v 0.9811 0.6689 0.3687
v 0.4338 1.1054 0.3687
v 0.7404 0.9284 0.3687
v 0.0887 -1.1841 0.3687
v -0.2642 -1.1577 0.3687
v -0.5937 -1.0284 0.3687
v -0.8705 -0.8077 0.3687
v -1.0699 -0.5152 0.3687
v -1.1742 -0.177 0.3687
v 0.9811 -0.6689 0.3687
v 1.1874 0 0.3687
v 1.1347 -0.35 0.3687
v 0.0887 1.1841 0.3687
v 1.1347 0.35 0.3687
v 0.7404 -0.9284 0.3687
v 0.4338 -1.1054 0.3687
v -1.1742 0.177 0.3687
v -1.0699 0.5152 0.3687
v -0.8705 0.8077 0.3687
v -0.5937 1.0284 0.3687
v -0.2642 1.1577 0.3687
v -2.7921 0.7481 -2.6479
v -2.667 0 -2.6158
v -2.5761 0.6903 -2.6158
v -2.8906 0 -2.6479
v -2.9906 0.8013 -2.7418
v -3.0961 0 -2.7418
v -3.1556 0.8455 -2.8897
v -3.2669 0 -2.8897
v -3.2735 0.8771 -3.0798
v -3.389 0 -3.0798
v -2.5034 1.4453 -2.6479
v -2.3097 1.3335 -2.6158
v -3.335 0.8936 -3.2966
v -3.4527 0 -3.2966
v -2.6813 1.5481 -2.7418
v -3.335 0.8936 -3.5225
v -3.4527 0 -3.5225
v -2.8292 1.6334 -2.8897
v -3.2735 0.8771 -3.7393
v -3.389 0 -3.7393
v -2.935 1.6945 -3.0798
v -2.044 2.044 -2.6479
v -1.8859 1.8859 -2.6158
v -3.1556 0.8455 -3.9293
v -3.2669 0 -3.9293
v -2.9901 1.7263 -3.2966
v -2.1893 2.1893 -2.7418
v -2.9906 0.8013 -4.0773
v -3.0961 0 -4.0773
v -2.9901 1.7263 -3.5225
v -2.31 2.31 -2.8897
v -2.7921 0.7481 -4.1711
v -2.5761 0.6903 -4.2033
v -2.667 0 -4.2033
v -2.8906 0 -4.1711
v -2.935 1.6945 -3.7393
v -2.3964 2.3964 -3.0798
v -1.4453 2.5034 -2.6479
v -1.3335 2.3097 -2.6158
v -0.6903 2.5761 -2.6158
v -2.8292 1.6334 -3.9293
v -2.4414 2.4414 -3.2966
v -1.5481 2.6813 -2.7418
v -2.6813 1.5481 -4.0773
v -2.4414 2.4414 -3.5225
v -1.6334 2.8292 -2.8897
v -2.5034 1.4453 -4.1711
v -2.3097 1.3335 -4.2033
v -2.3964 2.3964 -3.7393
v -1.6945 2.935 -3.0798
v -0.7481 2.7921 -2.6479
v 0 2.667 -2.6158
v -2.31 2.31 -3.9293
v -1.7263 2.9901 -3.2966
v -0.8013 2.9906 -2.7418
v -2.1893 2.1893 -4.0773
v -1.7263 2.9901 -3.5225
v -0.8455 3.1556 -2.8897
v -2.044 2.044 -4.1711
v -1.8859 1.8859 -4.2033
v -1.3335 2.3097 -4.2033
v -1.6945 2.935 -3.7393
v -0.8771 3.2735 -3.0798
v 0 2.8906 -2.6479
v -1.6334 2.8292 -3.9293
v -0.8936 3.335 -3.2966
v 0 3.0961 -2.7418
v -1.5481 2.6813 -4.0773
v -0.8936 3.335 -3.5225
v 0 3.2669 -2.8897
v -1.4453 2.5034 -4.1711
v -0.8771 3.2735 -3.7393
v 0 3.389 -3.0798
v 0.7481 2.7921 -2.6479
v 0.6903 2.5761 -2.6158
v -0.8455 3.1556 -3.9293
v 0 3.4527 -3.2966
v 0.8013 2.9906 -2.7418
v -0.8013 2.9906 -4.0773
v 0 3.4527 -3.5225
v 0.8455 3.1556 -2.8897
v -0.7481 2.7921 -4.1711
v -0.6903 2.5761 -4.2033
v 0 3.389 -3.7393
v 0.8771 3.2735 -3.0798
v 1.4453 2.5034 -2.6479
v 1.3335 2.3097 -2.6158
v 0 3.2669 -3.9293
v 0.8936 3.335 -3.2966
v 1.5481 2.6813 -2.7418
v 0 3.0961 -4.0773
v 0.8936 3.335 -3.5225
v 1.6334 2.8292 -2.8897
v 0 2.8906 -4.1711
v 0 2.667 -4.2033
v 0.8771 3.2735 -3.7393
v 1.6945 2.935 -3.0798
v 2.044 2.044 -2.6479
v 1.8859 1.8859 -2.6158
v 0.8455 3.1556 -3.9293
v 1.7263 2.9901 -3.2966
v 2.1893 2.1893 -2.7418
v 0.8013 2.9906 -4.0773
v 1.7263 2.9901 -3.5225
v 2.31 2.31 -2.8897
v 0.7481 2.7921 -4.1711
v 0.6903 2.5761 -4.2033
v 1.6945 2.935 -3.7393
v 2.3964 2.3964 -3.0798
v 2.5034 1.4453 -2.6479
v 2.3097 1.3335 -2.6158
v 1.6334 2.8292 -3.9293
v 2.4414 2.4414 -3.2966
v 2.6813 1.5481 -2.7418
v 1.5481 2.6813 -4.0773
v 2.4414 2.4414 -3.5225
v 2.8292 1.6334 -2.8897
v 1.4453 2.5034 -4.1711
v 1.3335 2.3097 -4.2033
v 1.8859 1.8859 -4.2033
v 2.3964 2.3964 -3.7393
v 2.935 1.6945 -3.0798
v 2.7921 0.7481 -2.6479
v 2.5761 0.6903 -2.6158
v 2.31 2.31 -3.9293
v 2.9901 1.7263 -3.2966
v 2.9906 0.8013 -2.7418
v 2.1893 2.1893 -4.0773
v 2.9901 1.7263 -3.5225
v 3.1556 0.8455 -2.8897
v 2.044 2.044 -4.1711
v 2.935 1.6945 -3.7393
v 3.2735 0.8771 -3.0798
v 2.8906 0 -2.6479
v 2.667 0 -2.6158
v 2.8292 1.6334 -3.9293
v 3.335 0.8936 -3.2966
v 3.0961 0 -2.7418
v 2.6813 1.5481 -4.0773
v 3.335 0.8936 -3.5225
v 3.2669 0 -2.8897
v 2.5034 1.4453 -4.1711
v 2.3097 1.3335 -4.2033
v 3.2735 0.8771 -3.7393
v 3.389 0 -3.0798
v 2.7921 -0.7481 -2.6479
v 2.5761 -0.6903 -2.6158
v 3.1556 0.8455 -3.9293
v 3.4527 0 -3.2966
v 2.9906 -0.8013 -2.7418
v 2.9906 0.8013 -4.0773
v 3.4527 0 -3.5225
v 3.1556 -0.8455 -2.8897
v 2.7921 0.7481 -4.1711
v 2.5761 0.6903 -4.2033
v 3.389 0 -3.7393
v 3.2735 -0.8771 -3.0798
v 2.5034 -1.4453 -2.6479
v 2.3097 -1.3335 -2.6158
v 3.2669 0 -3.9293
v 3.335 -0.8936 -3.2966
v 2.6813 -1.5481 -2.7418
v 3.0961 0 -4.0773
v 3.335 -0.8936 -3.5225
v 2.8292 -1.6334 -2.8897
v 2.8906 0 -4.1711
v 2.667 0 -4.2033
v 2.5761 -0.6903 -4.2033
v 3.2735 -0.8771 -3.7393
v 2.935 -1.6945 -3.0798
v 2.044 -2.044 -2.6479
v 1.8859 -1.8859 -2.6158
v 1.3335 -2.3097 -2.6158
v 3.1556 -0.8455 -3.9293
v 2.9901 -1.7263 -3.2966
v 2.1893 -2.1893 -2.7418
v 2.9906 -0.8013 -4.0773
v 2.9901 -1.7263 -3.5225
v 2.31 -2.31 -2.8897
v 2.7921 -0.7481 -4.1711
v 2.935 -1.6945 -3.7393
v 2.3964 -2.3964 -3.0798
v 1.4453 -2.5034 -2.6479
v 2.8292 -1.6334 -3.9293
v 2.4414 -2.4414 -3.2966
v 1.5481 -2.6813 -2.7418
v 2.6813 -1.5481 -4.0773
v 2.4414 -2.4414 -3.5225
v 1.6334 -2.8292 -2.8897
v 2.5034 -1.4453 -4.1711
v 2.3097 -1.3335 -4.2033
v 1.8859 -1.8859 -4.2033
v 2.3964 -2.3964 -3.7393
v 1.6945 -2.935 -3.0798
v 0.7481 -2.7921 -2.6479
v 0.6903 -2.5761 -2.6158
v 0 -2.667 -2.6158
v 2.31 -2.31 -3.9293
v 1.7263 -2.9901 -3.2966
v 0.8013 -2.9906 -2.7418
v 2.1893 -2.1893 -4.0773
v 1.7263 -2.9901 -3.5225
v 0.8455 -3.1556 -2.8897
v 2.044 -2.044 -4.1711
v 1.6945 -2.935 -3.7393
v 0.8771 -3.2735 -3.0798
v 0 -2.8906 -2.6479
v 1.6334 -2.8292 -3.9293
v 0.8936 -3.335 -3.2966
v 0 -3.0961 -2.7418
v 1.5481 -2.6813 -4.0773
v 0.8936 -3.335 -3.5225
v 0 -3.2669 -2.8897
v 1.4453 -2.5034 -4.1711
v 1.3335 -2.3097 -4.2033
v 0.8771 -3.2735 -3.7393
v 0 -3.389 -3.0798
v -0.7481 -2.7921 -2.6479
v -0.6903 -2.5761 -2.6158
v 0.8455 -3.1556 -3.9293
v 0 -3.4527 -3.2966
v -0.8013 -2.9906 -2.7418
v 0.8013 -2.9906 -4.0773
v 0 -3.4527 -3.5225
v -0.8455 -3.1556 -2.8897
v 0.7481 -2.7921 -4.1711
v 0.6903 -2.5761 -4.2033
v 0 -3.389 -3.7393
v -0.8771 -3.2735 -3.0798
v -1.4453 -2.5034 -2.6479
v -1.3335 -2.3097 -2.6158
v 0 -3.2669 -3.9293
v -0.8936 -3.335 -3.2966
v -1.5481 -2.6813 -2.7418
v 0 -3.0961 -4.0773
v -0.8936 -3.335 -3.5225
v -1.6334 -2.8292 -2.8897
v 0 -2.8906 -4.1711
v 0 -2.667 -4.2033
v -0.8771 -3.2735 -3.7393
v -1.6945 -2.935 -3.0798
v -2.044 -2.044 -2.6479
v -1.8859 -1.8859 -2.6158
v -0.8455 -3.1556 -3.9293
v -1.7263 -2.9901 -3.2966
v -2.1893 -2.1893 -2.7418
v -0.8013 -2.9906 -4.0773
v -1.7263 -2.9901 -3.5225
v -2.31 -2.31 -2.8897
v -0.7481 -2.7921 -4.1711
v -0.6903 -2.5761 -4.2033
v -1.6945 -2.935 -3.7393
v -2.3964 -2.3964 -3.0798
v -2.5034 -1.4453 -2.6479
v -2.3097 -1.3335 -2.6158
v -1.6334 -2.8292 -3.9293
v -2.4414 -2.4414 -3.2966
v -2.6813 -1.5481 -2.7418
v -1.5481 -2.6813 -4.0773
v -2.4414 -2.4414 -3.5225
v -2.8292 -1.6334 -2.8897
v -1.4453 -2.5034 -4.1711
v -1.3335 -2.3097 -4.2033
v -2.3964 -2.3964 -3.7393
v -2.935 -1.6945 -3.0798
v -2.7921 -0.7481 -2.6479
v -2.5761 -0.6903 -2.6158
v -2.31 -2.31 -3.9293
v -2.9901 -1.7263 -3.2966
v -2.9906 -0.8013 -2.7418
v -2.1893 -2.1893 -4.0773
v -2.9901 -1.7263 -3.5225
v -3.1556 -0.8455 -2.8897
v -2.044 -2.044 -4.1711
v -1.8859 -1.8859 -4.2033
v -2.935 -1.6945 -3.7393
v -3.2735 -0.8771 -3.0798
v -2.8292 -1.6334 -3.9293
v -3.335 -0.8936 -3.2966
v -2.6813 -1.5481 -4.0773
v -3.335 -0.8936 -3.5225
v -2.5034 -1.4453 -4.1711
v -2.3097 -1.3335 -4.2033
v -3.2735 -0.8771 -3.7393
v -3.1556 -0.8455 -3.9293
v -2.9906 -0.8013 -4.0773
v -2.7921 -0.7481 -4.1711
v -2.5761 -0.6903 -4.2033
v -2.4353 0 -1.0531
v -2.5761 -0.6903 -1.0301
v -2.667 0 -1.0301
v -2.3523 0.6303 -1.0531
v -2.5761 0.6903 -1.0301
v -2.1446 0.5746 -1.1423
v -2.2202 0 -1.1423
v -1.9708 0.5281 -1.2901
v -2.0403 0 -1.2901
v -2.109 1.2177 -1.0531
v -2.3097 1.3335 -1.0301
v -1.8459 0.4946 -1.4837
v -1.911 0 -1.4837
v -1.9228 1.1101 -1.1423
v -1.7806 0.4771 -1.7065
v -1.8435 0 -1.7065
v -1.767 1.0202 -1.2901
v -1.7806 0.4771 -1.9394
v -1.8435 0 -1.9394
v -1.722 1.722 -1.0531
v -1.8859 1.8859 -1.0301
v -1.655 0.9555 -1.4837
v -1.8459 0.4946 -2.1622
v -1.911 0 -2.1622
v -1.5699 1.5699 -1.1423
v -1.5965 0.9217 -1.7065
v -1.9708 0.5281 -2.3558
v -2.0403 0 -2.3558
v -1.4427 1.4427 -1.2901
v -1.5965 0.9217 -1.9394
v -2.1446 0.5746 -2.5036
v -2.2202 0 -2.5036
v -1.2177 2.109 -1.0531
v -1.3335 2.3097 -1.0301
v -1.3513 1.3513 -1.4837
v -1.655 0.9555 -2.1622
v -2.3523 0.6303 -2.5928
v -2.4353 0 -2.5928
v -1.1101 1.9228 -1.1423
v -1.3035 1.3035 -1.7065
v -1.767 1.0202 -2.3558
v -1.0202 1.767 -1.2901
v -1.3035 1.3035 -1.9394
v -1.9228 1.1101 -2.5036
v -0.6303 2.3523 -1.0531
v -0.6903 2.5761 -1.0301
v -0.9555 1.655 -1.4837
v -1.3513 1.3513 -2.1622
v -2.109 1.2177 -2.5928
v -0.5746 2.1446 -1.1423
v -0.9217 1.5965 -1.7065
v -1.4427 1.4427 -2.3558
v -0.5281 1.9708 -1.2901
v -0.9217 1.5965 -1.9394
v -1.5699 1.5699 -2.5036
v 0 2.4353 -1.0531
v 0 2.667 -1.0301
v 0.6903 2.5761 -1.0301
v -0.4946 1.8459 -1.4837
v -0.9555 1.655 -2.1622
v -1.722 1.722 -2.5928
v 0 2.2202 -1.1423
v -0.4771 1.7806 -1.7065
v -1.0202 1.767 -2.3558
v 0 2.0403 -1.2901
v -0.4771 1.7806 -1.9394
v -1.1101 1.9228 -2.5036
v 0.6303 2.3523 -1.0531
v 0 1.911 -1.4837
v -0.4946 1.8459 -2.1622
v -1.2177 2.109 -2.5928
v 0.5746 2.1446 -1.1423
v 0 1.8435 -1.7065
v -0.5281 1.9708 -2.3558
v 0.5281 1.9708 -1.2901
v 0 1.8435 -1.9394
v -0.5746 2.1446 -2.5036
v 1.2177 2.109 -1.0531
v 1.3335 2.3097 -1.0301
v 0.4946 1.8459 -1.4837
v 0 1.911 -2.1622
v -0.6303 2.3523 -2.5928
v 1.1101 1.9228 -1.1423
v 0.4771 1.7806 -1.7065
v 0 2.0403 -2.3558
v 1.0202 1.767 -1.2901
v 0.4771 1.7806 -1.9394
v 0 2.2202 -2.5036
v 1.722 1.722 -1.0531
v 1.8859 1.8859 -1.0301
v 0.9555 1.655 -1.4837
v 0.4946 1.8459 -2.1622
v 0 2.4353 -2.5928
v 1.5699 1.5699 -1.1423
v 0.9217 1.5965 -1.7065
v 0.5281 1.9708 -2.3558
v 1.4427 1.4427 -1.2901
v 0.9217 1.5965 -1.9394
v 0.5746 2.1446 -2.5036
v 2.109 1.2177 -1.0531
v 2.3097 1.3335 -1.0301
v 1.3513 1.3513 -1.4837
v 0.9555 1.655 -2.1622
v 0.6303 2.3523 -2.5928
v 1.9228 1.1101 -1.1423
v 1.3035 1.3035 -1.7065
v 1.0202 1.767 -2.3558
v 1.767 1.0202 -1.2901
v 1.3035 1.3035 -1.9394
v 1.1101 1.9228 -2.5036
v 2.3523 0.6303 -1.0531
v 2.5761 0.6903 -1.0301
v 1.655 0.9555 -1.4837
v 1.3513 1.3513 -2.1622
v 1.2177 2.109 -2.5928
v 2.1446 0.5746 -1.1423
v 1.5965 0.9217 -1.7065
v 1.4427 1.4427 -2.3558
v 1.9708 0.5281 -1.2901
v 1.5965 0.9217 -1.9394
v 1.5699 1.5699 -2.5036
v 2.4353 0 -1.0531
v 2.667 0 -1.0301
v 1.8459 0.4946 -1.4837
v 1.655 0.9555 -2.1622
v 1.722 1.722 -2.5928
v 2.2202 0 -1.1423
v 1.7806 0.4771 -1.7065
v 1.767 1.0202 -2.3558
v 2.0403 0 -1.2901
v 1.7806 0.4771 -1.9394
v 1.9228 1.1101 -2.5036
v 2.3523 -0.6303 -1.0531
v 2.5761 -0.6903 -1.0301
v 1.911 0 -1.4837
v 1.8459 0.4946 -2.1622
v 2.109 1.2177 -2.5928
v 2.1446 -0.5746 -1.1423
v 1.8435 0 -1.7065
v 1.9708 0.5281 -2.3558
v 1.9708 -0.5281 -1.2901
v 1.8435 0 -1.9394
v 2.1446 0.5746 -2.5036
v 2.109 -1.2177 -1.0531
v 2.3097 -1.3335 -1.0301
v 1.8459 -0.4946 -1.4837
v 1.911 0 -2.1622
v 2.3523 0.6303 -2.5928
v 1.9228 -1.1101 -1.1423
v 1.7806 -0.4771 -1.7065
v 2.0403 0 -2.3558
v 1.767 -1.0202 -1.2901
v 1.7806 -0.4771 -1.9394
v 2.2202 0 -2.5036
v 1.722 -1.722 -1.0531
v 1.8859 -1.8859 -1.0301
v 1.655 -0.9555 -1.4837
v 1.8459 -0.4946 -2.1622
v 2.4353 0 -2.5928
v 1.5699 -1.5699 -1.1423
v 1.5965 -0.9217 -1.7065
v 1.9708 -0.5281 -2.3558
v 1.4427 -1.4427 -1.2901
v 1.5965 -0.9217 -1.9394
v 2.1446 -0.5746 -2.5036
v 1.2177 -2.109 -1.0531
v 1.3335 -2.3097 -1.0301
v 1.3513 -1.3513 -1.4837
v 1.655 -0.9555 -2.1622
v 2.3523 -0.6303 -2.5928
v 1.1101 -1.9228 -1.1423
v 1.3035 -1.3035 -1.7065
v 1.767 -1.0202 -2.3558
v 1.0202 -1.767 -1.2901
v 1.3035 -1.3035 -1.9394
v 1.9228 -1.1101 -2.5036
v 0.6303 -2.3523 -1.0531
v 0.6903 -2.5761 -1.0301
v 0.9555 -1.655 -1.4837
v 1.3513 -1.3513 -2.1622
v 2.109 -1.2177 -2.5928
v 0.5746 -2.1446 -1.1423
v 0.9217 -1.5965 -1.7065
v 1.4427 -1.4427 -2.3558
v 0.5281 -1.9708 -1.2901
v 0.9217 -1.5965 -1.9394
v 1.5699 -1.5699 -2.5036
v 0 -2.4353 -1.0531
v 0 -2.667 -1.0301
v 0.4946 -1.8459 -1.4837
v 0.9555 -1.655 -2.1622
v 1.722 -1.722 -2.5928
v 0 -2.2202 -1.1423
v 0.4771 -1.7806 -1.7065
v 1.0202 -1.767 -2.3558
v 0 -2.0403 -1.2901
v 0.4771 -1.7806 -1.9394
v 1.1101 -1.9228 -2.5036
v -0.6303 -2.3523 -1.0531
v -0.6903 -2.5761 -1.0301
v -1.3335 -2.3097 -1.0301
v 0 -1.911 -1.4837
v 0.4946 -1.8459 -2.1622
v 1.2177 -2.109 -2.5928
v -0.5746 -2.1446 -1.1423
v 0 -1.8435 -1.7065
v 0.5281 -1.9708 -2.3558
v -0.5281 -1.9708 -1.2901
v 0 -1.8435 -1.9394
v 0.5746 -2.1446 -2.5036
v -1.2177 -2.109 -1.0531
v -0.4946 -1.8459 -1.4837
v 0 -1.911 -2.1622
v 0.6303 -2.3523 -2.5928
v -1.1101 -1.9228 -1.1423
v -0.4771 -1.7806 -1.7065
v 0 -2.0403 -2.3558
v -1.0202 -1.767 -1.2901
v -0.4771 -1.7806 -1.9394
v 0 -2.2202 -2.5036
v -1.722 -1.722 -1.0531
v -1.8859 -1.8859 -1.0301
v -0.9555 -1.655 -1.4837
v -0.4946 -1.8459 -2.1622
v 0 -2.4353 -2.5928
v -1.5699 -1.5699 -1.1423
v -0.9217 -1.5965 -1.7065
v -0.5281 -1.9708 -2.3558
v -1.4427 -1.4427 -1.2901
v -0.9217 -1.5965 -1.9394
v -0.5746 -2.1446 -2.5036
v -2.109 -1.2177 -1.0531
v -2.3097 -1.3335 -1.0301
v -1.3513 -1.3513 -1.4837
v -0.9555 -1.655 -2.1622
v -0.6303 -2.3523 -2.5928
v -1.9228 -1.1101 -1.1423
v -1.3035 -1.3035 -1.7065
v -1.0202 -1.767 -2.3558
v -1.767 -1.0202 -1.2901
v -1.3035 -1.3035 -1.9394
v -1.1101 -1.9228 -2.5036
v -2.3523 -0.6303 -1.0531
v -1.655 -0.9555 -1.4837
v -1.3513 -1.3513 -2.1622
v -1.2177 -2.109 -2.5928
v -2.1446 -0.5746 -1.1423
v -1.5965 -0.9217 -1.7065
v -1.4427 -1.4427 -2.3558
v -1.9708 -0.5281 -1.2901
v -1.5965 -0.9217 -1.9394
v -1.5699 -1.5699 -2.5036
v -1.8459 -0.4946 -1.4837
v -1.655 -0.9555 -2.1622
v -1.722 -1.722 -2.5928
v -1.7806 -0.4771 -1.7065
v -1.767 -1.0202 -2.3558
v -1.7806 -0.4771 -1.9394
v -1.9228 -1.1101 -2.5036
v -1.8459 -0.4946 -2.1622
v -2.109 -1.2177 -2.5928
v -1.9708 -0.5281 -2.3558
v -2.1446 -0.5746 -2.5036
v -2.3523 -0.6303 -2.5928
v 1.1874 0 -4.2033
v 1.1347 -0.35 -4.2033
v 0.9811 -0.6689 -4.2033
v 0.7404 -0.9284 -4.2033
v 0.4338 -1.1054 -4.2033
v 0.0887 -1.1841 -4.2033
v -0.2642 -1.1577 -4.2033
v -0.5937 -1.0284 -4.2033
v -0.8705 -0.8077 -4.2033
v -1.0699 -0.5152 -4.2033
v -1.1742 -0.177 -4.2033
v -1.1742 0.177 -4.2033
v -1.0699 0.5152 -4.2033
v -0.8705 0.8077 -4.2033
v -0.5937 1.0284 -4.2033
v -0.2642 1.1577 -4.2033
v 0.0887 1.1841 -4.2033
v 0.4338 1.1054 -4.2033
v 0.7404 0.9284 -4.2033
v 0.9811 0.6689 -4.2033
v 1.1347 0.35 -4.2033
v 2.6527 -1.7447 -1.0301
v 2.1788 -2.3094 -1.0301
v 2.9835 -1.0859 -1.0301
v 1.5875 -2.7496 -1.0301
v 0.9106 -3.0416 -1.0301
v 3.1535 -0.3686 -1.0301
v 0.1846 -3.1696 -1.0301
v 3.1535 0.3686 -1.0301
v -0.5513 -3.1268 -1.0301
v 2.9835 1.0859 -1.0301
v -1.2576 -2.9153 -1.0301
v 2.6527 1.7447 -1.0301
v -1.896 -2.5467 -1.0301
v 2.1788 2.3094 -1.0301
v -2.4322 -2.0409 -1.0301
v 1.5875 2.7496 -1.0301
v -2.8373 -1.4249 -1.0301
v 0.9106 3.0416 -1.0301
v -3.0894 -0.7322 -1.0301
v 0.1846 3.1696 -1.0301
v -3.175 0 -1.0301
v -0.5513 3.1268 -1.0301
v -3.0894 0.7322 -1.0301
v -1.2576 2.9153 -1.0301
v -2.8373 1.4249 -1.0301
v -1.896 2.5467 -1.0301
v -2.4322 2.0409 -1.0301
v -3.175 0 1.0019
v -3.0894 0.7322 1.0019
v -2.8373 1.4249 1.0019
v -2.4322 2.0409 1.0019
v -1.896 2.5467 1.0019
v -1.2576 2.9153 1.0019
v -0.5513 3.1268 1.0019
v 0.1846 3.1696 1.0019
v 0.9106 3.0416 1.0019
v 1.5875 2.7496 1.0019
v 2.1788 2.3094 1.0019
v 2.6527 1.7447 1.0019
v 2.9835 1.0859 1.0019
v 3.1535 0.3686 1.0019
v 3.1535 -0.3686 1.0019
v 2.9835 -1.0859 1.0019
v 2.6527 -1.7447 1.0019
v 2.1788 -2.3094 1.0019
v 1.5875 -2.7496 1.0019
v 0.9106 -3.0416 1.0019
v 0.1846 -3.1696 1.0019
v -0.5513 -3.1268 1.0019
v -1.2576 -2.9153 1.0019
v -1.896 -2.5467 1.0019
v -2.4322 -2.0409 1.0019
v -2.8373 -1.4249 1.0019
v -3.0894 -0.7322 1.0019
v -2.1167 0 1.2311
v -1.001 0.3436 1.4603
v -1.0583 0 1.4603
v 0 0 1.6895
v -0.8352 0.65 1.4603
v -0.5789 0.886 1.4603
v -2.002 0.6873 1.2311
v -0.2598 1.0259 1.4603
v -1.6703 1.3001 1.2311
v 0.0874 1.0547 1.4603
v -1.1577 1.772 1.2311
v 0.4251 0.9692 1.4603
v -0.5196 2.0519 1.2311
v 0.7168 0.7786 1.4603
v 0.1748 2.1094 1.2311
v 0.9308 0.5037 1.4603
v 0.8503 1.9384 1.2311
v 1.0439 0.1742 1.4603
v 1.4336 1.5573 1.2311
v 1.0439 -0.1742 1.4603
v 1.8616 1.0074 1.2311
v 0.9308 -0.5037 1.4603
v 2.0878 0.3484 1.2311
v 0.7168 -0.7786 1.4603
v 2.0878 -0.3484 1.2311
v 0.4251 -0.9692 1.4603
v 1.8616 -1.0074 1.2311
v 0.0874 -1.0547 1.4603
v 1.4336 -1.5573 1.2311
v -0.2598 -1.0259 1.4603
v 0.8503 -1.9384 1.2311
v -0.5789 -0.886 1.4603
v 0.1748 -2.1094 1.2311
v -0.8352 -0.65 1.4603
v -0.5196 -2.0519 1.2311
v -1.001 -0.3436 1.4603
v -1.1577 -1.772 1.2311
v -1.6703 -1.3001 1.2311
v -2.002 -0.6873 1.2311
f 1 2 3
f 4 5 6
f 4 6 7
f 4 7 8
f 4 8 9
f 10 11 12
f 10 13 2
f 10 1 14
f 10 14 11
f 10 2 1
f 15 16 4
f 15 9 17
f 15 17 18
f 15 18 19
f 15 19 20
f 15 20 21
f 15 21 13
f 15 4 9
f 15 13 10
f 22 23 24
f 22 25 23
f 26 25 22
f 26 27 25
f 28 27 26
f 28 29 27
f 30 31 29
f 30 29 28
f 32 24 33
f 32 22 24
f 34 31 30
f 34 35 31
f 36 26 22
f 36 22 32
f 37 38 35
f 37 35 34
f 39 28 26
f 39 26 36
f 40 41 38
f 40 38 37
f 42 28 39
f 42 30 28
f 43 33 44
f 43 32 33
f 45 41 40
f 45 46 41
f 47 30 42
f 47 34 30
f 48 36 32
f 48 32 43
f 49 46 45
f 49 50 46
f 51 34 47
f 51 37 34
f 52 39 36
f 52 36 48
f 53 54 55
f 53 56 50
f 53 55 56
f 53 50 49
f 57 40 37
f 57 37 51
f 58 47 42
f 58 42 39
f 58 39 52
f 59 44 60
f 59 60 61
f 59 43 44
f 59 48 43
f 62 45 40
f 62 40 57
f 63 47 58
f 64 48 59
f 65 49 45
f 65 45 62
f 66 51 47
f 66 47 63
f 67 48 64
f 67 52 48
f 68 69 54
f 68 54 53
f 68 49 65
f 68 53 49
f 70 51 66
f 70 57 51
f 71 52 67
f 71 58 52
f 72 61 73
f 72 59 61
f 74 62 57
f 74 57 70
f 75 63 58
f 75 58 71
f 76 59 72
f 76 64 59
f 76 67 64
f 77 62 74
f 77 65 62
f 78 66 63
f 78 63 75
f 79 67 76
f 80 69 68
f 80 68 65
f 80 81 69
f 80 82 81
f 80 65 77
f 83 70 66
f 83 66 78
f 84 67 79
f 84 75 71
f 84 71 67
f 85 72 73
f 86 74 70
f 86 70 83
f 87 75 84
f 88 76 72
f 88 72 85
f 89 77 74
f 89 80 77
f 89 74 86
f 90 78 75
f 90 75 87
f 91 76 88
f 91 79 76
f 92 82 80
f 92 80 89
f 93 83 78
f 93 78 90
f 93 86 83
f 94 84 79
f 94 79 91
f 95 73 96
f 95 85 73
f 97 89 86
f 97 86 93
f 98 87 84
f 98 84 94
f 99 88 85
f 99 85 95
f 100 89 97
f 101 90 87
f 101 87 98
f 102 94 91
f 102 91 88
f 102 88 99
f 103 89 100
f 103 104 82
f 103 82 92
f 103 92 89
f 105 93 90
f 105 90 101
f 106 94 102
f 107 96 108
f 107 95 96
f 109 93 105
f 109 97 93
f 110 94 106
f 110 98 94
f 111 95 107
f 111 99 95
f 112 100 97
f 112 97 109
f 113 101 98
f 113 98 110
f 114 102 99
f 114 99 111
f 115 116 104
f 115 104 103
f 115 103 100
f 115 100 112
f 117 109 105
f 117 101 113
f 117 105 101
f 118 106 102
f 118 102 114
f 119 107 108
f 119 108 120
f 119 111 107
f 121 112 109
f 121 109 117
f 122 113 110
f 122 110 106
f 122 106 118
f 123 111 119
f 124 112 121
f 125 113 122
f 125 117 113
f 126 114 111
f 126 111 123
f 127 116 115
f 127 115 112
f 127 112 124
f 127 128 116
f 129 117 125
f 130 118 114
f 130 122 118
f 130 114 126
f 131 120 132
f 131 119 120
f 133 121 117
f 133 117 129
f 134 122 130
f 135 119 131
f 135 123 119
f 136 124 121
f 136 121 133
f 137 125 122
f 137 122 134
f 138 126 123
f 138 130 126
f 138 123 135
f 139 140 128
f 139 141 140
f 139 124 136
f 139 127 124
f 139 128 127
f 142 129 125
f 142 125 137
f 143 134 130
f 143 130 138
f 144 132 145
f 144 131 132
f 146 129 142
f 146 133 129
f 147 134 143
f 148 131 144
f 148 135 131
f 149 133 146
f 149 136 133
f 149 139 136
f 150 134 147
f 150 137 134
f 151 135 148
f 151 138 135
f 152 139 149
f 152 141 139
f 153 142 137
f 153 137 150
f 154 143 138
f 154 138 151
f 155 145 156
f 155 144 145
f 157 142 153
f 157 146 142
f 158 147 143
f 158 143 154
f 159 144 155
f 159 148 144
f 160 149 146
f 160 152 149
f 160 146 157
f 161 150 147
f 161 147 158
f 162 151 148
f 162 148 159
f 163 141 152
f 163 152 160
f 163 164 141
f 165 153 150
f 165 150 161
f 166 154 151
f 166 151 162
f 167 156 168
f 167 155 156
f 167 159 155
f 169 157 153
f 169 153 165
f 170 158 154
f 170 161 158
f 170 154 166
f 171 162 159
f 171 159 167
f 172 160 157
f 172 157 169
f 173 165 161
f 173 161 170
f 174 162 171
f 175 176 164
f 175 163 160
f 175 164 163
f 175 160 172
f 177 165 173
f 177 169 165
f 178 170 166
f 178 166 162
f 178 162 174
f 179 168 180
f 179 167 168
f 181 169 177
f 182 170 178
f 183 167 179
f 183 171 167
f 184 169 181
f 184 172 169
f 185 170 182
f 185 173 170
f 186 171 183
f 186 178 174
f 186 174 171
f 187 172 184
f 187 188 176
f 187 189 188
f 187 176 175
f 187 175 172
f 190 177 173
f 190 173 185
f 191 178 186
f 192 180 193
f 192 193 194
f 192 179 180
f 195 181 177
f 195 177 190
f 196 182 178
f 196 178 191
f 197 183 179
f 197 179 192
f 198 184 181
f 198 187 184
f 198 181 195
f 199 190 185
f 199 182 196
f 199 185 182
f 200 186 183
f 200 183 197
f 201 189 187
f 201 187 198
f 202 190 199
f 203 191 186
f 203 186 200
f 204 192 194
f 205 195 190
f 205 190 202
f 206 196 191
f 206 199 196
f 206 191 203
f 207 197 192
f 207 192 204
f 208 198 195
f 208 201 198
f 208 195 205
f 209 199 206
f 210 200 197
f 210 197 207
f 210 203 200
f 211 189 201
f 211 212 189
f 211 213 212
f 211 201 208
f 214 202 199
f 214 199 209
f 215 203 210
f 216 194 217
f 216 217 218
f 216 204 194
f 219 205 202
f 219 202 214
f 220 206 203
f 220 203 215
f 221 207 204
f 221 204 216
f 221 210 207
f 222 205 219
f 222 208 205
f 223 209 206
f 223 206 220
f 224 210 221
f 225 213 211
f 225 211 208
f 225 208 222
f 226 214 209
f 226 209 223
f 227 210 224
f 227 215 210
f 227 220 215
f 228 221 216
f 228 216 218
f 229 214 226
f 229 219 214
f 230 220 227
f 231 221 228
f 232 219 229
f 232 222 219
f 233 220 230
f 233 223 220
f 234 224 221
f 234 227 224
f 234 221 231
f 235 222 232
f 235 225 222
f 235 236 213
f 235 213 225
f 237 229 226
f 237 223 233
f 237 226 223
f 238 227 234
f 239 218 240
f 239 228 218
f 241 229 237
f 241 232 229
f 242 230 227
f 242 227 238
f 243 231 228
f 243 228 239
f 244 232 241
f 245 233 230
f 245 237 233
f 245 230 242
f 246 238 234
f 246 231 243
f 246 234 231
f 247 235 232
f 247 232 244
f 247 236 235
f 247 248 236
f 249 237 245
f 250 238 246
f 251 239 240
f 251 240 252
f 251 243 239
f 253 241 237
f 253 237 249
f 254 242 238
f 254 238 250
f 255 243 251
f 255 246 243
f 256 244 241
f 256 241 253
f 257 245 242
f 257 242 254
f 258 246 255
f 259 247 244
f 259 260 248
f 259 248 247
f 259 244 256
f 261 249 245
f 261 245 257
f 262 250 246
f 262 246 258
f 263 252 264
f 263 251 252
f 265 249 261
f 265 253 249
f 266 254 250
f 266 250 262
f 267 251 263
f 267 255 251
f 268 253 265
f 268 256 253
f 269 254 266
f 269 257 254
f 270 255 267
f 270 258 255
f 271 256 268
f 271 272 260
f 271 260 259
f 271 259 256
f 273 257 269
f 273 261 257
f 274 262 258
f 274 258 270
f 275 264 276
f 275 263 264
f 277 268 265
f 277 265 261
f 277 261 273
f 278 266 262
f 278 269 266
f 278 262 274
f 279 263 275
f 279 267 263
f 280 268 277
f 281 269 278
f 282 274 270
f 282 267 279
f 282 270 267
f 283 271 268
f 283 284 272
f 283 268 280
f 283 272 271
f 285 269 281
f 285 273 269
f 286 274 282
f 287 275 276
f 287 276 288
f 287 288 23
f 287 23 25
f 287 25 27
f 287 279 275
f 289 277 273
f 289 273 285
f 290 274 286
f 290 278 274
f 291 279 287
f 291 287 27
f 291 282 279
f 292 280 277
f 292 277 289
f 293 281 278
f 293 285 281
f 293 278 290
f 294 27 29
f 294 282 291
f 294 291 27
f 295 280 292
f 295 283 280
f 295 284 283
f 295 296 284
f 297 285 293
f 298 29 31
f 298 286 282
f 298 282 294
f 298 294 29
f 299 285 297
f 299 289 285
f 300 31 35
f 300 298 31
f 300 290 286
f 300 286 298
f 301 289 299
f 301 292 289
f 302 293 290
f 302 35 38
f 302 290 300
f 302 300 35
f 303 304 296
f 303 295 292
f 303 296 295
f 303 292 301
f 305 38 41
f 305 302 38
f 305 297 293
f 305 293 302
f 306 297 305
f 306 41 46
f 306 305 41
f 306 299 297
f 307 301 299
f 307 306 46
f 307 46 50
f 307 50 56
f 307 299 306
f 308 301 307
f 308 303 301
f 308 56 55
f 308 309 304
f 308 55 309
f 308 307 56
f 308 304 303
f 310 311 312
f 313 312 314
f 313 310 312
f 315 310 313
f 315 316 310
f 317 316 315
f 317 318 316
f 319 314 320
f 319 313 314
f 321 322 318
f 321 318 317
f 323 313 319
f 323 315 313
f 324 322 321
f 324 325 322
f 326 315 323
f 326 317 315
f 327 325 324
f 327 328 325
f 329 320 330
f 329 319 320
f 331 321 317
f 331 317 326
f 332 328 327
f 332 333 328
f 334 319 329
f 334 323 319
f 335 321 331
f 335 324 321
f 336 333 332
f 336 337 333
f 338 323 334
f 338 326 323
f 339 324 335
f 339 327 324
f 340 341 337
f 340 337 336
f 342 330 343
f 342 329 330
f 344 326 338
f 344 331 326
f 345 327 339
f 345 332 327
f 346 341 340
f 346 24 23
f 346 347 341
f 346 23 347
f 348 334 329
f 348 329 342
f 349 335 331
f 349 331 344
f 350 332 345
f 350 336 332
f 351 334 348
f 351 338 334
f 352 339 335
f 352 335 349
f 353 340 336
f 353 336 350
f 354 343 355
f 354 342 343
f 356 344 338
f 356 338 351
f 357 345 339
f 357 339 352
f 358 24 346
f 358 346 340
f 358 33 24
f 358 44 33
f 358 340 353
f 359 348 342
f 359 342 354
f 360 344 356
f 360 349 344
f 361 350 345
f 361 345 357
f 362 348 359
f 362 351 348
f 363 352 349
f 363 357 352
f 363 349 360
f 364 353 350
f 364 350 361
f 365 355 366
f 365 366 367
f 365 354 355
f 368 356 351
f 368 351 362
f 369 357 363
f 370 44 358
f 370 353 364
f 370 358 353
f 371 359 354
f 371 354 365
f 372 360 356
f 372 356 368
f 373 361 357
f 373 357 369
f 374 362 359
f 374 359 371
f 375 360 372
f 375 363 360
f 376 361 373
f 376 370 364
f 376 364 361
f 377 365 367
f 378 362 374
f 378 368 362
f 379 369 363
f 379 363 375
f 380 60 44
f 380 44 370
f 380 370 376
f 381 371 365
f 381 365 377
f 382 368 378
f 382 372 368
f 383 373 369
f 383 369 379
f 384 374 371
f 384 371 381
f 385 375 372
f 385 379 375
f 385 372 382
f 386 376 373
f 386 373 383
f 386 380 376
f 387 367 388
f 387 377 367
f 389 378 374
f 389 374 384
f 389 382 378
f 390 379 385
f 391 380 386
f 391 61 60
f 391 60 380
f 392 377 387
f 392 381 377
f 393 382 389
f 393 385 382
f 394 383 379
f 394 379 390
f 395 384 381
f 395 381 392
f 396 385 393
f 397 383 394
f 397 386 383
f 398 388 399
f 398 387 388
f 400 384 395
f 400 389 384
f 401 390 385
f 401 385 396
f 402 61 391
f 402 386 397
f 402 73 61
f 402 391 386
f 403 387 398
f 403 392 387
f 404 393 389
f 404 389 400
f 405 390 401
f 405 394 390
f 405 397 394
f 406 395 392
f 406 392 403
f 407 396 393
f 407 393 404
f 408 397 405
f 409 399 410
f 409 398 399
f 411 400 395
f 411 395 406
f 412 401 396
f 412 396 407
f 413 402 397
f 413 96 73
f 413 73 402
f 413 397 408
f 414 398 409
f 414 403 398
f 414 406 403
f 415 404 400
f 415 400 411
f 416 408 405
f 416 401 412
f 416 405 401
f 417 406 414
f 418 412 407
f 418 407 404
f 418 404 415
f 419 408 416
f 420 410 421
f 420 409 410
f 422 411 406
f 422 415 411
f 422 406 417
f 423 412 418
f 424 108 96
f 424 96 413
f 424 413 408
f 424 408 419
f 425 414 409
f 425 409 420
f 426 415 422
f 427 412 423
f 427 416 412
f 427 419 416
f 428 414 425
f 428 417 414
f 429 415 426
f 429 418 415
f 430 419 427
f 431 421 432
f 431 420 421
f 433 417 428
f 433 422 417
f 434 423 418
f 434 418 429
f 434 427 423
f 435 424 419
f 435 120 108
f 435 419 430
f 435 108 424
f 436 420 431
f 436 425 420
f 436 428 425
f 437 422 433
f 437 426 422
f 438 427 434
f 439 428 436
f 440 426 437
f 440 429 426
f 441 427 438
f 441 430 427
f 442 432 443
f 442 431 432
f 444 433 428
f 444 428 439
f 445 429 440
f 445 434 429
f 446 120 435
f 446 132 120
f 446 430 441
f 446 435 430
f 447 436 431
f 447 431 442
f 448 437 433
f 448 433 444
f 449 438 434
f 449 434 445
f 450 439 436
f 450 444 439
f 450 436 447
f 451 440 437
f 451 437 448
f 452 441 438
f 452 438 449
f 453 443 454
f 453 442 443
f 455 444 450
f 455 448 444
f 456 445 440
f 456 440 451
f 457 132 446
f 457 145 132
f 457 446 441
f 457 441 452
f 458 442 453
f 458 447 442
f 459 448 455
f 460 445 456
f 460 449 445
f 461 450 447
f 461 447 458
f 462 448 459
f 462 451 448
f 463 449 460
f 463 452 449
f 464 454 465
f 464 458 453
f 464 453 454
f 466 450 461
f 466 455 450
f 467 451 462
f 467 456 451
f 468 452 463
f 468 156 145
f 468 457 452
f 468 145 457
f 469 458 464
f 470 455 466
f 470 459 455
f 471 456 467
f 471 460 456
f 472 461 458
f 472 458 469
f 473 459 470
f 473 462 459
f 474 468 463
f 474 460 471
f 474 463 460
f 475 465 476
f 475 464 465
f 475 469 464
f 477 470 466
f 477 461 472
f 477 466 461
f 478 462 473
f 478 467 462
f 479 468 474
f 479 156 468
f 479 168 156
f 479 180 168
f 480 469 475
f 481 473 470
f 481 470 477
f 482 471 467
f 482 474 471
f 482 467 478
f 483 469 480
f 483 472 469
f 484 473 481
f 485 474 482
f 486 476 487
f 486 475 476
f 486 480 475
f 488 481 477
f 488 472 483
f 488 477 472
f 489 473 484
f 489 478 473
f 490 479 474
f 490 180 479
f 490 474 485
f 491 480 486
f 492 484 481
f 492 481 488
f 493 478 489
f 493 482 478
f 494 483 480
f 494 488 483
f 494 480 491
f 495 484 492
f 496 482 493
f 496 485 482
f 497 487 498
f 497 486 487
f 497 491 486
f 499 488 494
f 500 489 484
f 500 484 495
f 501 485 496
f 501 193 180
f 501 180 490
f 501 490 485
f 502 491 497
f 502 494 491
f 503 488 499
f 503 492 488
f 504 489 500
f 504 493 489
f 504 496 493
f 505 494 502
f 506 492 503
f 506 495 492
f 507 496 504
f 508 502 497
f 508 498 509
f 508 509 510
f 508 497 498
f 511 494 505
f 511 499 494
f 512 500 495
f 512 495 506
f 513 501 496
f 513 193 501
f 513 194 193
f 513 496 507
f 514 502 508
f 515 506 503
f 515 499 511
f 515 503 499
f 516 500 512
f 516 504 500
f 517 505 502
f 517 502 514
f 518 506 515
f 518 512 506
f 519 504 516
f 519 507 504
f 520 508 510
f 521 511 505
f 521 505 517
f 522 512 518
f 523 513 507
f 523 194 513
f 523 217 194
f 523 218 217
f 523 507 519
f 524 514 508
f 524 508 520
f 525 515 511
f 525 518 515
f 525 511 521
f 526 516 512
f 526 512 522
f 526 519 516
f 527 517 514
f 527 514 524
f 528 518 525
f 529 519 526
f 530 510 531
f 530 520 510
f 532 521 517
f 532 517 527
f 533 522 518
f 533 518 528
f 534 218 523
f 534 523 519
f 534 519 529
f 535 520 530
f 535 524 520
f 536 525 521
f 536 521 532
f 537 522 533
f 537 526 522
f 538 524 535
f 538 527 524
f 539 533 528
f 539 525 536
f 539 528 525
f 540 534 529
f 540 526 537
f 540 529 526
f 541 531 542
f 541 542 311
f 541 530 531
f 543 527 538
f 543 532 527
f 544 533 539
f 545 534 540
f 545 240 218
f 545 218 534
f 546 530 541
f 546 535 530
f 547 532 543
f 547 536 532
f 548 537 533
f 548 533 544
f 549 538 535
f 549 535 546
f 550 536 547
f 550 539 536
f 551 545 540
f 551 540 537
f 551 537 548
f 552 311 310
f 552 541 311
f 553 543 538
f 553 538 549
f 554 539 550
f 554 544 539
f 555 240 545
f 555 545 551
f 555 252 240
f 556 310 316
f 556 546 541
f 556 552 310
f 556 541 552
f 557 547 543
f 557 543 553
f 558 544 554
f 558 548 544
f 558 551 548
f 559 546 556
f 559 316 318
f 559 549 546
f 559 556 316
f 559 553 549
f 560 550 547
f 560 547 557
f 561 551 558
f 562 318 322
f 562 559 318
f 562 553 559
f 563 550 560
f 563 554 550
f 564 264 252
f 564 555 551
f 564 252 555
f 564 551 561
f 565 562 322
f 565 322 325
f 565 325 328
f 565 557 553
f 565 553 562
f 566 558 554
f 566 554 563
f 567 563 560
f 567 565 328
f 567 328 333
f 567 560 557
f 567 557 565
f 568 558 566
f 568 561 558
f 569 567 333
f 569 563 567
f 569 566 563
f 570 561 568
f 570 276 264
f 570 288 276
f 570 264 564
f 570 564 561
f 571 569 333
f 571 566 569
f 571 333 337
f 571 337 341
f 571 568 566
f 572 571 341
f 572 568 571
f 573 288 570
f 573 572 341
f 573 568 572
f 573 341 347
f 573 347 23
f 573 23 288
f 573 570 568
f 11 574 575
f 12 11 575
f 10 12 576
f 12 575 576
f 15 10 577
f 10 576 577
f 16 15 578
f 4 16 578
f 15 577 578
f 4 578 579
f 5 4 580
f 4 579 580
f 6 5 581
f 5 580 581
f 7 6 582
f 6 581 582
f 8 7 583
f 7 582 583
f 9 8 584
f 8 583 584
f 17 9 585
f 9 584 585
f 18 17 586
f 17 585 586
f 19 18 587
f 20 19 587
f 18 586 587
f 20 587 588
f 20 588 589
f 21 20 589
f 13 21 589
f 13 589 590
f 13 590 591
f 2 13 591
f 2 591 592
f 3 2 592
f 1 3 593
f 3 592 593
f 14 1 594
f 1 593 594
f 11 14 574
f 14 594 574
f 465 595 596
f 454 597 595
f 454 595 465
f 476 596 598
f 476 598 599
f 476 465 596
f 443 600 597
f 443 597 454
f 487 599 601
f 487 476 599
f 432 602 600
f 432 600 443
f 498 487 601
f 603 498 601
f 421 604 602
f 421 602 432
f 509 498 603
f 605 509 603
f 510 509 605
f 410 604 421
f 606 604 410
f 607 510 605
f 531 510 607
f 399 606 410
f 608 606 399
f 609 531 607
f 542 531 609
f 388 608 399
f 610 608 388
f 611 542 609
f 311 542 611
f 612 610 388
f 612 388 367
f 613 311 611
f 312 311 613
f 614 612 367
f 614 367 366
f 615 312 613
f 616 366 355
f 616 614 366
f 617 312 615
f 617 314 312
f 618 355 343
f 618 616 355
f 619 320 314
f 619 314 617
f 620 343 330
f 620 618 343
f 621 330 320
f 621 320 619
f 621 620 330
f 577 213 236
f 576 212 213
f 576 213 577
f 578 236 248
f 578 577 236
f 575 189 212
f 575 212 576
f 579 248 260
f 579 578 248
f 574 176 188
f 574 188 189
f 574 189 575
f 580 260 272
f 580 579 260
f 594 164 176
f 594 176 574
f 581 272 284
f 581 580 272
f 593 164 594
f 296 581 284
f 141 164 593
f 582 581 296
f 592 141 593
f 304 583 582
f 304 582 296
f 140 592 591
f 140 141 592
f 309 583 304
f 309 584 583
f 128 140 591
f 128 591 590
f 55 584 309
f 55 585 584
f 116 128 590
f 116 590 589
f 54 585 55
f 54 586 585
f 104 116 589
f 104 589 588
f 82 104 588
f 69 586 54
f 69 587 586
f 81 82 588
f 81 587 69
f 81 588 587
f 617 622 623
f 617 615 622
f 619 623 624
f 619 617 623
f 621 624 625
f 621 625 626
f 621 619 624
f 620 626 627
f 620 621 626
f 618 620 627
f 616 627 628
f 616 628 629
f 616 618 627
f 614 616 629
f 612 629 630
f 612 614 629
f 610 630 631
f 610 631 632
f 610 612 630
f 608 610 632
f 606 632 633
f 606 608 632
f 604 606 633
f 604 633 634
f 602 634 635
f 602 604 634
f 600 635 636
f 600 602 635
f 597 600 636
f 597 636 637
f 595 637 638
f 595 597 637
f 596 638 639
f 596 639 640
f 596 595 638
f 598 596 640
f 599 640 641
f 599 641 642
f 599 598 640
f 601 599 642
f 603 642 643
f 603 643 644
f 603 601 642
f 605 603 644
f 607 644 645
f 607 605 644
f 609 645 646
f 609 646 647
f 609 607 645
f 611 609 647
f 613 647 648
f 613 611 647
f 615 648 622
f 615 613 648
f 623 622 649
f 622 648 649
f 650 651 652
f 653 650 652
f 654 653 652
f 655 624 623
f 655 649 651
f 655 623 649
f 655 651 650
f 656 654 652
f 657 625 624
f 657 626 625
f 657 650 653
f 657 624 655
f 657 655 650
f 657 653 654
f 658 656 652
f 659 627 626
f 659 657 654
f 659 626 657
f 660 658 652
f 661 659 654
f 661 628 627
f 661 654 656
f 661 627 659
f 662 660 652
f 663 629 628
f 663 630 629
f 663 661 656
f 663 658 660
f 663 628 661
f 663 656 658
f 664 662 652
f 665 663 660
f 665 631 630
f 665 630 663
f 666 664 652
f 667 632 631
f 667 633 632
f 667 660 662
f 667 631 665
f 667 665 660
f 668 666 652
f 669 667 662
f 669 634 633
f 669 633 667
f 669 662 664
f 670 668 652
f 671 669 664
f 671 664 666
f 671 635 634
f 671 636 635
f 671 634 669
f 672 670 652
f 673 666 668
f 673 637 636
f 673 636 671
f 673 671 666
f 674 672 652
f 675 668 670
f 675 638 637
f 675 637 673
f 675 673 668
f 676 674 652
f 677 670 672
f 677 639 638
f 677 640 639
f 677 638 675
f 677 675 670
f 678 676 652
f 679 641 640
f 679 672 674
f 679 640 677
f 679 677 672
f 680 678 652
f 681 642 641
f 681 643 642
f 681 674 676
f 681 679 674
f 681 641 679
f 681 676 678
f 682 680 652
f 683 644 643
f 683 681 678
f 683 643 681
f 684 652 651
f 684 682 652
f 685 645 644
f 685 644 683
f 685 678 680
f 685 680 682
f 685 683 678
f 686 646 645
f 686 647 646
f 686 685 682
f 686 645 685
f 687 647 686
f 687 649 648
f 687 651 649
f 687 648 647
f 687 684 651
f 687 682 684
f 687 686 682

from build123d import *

# Parameters (mm, degrees)
F2_R     = 1.18745
F3_DEPTH = 4.572


with BuildPart() as f1:
    # F0 (on Front) → F1 (revolve)
    with BuildSketch(Plane.XZ):
        with BuildLine():
            Line((0, -4.203269), (0, 1.689531))
            Line((0, 1.689531), (-3.175, 1.001874))
            Line((-3.175, 1.001874), (-3.175, -1.030126))
            Line((-3.175, -1.030126), (-2.667, -1.030126))
            ThreePointArc((-2.667, -1.030126), (-1.834871, -1.822947), (-2.667, -2.615769))
            ThreePointArc((-2.667, -2.615769), (-3.46075, -3.409519), (-2.667, -4.203269))
            Line((-2.667, -4.203269), (0, -4.203269))
        make_face()
    revolve(axis=Axis((0, 0, 0.38379), (0, 0, -1)))

    # F2 (on face) → F3 (cut)
    with BuildSketch(Plane(origin=(0, 0, -4.203269), x_dir=(1, 0, 0), z_dir=(0, 0, -1))):
        Circle(F2_R)
    extrude(amount=-F3_DEPTH, mode=Mode.SUBTRACT)


solid = f1.part
